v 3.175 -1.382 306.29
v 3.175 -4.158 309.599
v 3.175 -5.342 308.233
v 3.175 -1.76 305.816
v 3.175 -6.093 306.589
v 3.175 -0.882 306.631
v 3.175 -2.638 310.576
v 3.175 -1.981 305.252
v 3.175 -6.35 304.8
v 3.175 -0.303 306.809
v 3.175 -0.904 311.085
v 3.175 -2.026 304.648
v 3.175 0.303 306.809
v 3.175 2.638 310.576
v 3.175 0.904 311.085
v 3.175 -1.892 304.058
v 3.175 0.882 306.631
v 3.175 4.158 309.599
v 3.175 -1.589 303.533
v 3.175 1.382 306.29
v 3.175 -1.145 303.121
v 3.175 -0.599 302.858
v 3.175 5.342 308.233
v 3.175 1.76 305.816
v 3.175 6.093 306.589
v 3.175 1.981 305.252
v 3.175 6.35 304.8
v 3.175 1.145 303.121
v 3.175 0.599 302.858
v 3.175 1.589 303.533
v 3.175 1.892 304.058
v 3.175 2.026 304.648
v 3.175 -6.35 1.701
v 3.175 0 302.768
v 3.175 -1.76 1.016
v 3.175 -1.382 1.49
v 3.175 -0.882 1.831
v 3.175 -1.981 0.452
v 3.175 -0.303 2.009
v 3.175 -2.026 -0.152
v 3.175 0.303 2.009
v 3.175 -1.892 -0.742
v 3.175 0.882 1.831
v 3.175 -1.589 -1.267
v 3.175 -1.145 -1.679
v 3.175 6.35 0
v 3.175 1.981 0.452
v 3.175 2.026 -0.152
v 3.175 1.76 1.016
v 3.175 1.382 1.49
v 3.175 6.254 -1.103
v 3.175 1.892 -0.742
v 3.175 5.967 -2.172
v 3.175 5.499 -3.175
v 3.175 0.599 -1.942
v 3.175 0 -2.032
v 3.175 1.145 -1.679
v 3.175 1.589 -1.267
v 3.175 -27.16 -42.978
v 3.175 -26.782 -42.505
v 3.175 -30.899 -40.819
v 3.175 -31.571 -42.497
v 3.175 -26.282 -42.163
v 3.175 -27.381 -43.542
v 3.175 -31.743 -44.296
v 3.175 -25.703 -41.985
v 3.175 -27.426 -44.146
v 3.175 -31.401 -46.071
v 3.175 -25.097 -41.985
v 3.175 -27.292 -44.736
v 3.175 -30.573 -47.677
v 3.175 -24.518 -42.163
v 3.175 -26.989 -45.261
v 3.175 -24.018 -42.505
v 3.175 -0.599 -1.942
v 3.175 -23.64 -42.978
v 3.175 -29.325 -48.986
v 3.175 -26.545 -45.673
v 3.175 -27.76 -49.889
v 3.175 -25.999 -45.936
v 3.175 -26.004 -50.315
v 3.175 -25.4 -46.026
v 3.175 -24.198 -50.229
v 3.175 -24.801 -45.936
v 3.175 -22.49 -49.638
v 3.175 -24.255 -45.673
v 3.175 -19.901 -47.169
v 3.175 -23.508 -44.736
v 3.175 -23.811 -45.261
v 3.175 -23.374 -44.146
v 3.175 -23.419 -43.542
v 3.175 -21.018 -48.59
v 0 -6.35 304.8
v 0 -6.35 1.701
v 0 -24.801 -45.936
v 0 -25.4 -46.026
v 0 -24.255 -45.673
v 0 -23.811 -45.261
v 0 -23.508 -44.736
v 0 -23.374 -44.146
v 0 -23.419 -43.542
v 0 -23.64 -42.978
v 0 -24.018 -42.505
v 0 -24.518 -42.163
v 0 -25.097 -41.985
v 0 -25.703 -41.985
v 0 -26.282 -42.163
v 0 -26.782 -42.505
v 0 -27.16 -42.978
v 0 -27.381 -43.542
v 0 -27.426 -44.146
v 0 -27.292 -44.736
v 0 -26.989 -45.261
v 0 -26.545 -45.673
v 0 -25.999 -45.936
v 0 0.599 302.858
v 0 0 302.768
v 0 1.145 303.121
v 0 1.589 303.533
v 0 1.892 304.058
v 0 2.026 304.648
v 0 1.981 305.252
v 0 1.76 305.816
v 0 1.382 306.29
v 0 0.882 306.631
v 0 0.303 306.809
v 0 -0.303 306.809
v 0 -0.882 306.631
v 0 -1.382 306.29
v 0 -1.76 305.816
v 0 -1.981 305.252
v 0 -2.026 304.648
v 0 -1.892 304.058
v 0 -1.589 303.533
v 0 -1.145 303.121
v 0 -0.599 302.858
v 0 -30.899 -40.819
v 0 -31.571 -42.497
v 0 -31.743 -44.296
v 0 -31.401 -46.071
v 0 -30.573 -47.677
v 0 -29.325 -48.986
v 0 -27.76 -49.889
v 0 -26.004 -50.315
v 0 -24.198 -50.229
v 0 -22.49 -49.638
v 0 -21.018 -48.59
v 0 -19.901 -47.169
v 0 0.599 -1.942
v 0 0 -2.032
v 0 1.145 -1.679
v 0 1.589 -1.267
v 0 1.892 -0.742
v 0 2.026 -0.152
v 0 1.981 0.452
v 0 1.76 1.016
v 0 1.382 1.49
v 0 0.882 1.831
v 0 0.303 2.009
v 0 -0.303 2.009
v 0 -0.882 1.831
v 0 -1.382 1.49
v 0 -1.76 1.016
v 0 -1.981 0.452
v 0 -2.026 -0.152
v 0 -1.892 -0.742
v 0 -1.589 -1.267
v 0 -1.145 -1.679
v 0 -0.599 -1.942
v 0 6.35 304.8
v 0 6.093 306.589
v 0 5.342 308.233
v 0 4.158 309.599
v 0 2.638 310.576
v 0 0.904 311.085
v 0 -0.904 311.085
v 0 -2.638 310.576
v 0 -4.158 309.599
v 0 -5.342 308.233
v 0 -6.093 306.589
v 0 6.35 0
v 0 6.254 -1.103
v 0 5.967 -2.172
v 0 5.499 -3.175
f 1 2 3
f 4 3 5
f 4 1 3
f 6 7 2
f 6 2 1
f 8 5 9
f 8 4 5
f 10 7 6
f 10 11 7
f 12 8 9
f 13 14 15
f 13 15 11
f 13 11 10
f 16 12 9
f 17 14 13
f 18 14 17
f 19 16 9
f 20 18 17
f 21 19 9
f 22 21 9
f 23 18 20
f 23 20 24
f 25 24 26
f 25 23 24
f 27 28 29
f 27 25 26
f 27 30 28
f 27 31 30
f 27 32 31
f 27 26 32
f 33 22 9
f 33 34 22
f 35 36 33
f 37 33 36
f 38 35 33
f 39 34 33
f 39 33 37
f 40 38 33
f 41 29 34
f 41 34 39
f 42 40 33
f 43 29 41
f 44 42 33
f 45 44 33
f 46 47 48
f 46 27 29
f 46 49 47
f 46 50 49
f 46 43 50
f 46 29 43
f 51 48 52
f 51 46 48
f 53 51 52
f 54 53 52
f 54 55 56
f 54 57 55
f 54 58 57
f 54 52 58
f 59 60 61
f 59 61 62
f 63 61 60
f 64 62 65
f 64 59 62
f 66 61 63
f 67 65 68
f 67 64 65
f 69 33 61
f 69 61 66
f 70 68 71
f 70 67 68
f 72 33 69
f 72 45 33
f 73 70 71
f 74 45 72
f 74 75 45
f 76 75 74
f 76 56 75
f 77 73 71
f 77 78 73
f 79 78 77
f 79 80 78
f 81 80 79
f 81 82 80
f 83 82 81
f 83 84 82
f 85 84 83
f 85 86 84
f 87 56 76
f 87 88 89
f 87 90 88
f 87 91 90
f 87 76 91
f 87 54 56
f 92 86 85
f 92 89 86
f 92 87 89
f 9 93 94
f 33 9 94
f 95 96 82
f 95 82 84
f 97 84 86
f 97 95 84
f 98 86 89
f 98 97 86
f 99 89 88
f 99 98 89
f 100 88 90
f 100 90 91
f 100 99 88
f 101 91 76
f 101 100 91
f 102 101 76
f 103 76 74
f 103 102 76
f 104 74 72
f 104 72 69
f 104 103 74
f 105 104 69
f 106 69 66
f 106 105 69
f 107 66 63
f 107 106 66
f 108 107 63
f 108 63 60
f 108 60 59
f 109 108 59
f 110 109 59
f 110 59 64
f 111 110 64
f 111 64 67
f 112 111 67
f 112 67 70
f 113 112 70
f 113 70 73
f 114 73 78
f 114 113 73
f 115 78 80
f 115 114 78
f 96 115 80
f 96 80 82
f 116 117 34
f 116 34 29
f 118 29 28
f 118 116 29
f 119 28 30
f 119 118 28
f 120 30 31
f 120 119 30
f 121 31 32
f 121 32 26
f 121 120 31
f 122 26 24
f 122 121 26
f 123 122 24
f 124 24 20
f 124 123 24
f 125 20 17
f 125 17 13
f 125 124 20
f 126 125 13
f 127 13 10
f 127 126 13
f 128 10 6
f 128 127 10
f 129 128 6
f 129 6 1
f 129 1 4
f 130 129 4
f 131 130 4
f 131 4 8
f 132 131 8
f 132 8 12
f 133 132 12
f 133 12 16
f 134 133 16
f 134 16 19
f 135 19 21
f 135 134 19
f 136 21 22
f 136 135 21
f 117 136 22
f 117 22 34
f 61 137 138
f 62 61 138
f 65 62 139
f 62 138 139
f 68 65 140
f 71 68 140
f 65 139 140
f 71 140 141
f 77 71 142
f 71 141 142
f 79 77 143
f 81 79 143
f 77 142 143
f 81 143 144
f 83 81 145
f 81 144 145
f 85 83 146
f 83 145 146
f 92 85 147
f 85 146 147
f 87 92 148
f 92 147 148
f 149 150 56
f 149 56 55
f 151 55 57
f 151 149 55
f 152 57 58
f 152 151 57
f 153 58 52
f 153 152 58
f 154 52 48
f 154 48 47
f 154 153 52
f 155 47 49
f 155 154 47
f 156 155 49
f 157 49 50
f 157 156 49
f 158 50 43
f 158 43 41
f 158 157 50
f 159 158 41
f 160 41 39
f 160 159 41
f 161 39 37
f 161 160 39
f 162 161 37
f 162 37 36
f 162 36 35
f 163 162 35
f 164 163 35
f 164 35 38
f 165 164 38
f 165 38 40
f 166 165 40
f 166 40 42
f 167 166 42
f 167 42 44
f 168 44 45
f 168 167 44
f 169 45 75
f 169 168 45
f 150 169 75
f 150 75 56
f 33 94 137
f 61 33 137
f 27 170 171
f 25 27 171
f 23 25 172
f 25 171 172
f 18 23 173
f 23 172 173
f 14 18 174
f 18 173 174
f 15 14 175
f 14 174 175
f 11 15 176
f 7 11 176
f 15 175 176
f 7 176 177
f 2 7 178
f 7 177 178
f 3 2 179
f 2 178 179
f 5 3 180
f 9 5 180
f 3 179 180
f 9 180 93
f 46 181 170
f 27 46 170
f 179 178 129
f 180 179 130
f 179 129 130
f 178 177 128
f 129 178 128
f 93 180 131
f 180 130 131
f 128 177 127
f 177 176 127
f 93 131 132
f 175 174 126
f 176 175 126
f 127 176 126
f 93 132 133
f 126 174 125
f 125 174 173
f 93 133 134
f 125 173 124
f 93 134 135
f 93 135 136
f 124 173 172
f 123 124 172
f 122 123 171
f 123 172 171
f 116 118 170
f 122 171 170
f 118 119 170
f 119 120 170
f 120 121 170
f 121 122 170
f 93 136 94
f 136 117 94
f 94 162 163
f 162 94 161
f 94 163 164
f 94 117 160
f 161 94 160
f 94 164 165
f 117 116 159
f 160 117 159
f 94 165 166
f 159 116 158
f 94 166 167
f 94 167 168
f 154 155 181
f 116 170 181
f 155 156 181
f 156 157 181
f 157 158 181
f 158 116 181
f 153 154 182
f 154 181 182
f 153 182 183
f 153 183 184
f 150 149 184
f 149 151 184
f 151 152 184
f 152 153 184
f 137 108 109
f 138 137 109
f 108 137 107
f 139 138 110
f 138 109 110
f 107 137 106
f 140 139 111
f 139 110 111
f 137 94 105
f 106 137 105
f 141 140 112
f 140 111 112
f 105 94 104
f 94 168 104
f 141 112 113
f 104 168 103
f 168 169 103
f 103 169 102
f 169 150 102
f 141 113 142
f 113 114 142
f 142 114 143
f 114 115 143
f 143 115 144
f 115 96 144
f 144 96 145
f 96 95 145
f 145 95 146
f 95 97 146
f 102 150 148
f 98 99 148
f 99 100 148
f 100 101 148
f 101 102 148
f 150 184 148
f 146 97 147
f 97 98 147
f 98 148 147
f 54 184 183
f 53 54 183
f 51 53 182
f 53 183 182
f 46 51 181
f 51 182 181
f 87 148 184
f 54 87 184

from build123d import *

# Parameters (mm, degrees)
SKETCH1_R           = 2.032
BOSS_EXTRUDE1_DEPTH = 3.175


with BuildPart() as part:
    # Sketch1 → Boss-Extrude1 (new body)
    # profile 1 of 3: a face of its own
    with BuildSketch(Plane(origin=(0, 0, 0), x_dir=(0, 0, -1), z_dir=(1, 0, 0))):
        with BuildLine():
            Line((47.169090512, -19.900738686), (3.175, 5.499261314))
            ThreePointArc((3.175, 5.499261314), (6.133628997, -1.643500936), (0, -6.35))
            Line((0, -6.35), (-1.701477372, -6.35))
            Line((-1.701477372, -6.35), (40.819090512, -30.899261314))
            ThreePointArc((40.819090512, -30.899261314), (49.493351826, -28.575), (47.169090512, -19.900738686))
        make_face()
        with Locations((43.994090512, -25.4)):
            Circle(SKETCH1_R, mode=Mode.SUBTRACT)
    # profile 2 of 3: a face of its own
    with BuildSketch(Plane(origin=(0, 0, 0), x_dir=(0, 0, -1), z_dir=(1, 0, 0))):
        with BuildLine():
            ThreePointArc((0, -6.35), (6.133628997, -1.643500936), (3.175, 5.499261314))
            ThreePointArc((3.175, 5.499261314), (1.643500936, 6.133628997), (0, 6.35))
            ThreePointArc((0, 6.35), (-6.133628997, 1.643500936), (-3.175, -5.499261314))
            Line((-3.175, -5.499261314), (-1.701477372, -6.35))
            Line((-1.701477372, -6.35), (0, -6.35))
        make_face()
        Circle(SKETCH1_R, mode=Mode.SUBTRACT)
    # profile 3 of 3: a face of its own
    with BuildSketch(Plane(origin=(0, 0, 0), x_dir=(0, 0, -1), z_dir=(1, 0, 0))):
        with BuildLine():
            ThreePointArc((-3.175, -5.499261314), (-6.133628997, 1.643500936), (0, 6.35))
            Line((0, 6.35), (-304.8, 6.35))
            ThreePointArc((-304.8, 6.35), (-311.15, 0), (-304.8, -6.35))
            Line((-304.8, -6.35), (-1.701477372, -6.35))
            Line((-1.701477372, -6.35), (-3.175, -5.499261314))
        make_face()
        with Locations((-304.8, 0)):
            Circle(SKETCH1_R, mode=Mode.SUBTRACT)
    extrude(amount=BOSS_EXTRUDE1_DEPTH)


solid = part.part
